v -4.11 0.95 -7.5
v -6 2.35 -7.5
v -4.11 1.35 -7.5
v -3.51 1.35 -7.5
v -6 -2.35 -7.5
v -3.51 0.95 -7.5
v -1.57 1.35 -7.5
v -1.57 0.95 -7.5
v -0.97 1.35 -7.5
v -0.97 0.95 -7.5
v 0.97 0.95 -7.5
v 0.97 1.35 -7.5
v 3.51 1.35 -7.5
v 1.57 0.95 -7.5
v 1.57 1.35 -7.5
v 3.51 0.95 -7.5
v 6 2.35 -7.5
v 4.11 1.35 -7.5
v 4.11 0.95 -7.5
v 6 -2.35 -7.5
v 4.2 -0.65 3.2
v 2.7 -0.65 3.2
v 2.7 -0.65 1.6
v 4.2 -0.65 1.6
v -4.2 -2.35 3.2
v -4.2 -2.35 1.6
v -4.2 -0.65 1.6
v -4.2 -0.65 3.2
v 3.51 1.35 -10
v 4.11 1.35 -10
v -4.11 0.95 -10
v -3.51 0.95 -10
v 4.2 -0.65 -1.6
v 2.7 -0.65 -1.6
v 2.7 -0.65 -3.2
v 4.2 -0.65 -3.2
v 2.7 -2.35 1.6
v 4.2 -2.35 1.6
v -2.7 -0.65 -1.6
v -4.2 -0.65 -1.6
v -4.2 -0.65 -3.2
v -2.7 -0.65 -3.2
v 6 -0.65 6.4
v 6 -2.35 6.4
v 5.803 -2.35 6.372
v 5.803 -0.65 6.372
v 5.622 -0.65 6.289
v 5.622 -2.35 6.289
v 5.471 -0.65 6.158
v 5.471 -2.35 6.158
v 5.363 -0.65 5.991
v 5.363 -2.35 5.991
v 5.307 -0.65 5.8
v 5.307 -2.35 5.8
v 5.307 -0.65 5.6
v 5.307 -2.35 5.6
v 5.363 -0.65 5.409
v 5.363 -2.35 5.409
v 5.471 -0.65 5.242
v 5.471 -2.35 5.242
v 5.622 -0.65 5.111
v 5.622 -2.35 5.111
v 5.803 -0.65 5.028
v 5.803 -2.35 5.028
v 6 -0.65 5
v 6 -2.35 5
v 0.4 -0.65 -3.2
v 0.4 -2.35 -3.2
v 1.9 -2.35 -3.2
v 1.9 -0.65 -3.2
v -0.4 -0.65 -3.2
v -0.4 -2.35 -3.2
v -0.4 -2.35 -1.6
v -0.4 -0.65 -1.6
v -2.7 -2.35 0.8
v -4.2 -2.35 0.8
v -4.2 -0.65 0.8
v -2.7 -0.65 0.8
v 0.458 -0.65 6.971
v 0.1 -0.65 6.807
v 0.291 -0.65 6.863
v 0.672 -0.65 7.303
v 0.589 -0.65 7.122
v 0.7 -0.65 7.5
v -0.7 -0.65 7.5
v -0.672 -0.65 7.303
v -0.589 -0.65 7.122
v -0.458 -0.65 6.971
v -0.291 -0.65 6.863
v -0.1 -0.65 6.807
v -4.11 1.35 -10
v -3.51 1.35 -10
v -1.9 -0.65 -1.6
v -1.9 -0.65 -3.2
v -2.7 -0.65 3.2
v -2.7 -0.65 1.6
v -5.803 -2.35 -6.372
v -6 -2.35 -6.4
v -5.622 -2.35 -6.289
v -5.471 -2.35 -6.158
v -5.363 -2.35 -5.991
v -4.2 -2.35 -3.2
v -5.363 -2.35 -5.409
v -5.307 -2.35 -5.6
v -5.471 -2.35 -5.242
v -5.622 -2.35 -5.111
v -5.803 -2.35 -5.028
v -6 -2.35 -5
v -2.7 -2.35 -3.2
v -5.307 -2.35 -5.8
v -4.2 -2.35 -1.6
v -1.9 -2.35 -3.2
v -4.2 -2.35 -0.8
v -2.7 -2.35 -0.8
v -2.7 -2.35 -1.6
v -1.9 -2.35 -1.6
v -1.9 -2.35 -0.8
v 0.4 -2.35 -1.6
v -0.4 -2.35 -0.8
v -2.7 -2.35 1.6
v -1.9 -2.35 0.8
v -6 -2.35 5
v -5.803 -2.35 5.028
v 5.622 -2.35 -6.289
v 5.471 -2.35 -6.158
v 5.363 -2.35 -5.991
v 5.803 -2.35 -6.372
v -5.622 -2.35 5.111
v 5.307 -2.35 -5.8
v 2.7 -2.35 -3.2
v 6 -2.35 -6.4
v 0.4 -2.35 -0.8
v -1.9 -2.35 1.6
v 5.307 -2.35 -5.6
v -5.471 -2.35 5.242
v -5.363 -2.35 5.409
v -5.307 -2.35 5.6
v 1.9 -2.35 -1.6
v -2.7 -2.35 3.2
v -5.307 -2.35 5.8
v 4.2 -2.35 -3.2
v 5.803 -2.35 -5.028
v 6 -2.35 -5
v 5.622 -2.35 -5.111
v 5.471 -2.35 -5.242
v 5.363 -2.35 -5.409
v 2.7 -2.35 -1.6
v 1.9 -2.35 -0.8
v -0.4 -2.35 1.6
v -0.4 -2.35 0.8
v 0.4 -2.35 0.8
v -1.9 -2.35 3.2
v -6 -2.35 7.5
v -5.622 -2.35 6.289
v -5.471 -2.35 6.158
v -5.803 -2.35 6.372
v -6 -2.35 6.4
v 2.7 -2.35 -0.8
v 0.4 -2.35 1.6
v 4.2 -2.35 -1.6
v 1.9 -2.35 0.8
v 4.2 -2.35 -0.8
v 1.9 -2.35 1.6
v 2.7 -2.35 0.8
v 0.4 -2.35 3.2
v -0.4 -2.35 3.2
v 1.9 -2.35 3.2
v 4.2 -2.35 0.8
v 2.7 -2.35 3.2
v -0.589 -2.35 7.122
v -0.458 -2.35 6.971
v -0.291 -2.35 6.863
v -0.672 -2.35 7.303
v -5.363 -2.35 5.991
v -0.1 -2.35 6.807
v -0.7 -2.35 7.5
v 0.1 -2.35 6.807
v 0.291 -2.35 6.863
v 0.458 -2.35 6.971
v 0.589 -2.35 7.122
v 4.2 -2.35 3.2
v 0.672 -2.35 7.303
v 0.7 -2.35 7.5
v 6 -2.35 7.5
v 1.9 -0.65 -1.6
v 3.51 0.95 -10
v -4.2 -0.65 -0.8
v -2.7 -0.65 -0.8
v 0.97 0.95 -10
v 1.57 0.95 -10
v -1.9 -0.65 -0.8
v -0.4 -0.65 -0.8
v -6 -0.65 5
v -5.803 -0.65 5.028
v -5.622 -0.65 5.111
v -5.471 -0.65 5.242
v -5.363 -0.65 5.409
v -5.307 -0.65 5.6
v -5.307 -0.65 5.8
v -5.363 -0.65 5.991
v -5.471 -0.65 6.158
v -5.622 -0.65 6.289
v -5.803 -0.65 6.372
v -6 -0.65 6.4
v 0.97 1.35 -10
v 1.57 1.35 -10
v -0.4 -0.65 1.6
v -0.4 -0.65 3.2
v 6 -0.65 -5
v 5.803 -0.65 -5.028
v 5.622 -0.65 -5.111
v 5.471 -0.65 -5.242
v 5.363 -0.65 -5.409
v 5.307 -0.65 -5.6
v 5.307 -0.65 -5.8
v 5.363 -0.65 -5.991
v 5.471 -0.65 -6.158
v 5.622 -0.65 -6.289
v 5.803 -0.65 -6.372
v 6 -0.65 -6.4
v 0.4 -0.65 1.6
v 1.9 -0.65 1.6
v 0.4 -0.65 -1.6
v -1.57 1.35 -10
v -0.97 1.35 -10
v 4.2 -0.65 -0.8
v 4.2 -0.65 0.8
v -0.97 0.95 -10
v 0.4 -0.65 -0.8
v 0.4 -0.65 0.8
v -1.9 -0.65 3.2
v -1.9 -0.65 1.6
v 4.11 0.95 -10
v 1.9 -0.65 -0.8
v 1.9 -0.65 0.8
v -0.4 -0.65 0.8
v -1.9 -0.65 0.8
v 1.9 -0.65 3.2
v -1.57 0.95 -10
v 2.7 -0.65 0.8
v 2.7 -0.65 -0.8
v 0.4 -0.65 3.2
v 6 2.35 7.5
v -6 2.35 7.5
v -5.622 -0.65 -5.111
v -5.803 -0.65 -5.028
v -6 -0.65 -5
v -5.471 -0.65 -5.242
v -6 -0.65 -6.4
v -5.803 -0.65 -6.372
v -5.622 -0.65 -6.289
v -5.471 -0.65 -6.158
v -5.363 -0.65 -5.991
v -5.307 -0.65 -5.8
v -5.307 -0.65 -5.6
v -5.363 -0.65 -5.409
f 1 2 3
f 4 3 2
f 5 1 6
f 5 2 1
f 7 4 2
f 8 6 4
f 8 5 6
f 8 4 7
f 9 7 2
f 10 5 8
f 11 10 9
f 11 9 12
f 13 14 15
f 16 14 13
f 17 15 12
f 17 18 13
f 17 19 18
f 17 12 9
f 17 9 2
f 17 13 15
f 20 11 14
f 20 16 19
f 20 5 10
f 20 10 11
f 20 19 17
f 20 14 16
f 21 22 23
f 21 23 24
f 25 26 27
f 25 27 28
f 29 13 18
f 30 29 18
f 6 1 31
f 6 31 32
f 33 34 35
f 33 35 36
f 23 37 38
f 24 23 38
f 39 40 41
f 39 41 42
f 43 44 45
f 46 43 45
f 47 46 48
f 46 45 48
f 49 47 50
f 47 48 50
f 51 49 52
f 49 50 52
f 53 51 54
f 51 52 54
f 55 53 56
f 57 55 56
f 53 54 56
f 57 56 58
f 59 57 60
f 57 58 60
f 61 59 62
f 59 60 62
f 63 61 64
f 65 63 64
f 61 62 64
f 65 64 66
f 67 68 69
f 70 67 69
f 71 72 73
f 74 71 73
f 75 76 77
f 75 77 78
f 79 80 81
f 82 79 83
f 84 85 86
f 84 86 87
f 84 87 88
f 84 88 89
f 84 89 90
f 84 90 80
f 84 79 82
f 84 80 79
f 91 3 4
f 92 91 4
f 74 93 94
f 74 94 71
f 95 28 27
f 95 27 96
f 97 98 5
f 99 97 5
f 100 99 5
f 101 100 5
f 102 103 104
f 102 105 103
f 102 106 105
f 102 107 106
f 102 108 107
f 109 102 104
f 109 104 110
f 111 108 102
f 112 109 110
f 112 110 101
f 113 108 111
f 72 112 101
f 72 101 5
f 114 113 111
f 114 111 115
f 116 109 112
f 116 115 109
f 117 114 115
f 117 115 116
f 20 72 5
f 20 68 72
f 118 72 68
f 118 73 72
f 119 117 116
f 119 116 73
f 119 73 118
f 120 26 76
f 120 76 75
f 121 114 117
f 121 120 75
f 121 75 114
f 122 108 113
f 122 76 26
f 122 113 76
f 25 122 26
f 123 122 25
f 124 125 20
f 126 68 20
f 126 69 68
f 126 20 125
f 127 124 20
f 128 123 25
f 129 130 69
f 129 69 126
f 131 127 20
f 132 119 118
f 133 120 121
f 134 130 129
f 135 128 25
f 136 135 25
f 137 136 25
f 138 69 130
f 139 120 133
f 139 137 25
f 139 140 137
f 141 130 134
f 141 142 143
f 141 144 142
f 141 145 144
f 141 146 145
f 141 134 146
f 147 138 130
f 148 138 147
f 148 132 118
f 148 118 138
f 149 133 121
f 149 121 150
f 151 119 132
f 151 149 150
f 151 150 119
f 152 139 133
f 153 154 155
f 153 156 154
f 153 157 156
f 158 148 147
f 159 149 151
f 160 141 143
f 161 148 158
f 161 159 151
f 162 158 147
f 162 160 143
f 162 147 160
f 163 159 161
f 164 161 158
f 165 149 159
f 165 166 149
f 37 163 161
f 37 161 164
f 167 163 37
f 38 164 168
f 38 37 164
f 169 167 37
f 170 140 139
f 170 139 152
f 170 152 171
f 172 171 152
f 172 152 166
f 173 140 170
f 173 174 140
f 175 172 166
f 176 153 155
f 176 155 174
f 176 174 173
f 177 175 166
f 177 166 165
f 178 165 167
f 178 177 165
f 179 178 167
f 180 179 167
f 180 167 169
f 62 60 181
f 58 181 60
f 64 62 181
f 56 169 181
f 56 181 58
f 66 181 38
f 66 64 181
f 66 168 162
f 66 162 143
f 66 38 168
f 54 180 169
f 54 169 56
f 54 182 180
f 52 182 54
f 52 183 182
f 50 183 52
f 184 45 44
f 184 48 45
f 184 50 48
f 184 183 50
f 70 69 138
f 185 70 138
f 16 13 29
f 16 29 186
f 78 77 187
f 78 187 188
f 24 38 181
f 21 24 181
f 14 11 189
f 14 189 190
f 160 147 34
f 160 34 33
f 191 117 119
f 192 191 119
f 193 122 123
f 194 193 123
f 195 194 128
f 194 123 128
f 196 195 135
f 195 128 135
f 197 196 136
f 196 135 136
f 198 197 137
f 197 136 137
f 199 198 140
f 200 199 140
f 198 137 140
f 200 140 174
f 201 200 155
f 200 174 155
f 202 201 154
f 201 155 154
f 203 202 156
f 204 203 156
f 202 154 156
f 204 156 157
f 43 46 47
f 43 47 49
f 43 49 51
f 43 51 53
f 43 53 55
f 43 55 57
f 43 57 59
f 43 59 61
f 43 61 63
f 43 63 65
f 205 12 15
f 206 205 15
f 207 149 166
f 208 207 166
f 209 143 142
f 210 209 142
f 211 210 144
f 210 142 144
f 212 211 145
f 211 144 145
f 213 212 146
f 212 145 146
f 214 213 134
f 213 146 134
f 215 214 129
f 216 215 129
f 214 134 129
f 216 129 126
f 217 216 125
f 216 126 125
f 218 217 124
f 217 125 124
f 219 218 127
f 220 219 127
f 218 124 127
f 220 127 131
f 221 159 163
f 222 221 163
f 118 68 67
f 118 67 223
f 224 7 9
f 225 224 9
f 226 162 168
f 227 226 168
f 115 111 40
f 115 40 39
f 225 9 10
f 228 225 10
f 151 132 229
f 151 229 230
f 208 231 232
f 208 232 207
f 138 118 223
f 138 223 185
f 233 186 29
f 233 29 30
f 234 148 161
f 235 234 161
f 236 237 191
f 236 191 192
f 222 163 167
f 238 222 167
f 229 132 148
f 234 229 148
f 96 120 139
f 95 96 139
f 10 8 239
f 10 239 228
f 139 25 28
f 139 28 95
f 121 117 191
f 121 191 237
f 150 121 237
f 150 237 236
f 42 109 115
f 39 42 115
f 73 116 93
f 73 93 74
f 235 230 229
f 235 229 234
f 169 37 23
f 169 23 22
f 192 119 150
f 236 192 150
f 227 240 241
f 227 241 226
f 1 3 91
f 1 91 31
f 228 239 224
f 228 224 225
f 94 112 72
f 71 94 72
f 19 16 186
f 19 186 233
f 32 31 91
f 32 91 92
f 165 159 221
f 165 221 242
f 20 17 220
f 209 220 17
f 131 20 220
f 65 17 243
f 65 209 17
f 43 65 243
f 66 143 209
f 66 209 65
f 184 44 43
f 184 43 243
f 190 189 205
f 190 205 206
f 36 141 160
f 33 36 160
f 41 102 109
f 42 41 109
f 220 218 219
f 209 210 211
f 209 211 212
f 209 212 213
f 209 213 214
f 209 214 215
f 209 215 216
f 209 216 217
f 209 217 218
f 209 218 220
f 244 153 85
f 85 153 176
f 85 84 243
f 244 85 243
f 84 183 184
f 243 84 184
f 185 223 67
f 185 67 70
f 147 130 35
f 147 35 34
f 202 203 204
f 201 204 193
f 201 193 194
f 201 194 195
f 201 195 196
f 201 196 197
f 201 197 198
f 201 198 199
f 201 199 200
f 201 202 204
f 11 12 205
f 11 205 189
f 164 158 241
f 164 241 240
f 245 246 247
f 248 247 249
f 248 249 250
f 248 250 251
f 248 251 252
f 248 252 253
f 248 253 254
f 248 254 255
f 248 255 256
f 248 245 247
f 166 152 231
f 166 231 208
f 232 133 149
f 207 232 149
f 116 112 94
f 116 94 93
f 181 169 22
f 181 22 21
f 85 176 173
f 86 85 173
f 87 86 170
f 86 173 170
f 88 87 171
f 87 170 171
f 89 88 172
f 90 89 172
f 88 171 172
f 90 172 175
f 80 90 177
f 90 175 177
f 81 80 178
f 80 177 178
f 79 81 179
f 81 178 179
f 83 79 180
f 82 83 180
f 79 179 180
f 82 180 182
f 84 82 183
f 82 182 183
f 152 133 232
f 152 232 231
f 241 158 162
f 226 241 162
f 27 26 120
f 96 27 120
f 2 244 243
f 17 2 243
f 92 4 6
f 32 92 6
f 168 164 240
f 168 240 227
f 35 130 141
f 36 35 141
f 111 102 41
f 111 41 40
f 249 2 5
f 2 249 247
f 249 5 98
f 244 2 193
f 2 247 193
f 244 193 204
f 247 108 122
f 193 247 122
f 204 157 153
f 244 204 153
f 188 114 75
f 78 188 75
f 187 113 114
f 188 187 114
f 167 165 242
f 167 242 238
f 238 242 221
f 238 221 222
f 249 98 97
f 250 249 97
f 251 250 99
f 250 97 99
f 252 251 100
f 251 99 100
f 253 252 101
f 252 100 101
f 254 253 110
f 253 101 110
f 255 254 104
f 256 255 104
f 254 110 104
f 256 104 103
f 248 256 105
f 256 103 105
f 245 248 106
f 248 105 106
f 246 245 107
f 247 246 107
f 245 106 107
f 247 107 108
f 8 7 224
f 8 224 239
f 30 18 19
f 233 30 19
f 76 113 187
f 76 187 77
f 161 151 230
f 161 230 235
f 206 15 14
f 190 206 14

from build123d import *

# Parameters (mm, degrees)
F0_W     = 12
F0_H     = 15
F1_DEPTH = 2.35
F2_W     = 1.5
F2_H     = 1.6
F3_DEPTH = 1.7
F4_W     = 0.6
F4_H     = 0.4
F5_DEPTH = 2.5


with BuildPart() as f1:
    # F0 (on Front) → F1 (new body, symmetric)
    with BuildSketch(Plane.XZ):
        Rectangle(F0_W, F0_H)
    extrude(amount=F1_DEPTH, both=True)

    # F2 (on face) → F3 (cut)
    with BuildSketch(Plane.XZ.offset(2.35)):
        with BuildLine():
            Line((-6, 6.4), (-6, 5))
            ThreePointArc((-6, 5), (-5.3, 5.7), (-6, 6.4))
        make_face()
        with Locations((-3.45, 2.4)):
            Rectangle(F2_W, F2_H)
        with Locations((-1.15, 2.4)):
            Rectangle(F2_W, F2_H)
        with Locations((1.15, 2.4)):
            Rectangle(F2_W, F2_H)
        with Locations((3.45, 2.4)):
            Rectangle(F2_W, F2_H)
        with Locations((3.45, 0)):
            Rectangle(F2_W, F2_H)
        with Locations((1.15, 0)):
            Rectangle(F2_W, F2_H)
        with Locations((-1.15, 0)):
            Rectangle(F2_W, F2_H)
        with Locations((-3.45, 0)):
            Rectangle(F2_W, F2_H)
        with Locations((-3.45, -2.4)):
            Rectangle(F2_W, F2_H)
        with Locations((-1.15, -2.4)):
            Rectangle(F2_W, F2_H)
        with Locations((1.15, -2.4)):
            Rectangle(F2_W, F2_H)
        with Locations((3.45, -2.4)):
            Rectangle(F2_W, F2_H)
        with BuildLine():
            Line((6, -6.4), (6, -5))
            ThreePointArc((6, -5), (5.3, -5.7), (6, -6.4))
        make_face()
        with BuildLine():
            Line((-6, -5), (-6, -6.4))
            ThreePointArc((-6, -6.4), (-5.3, -5.7), (-6, -5))
        make_face()
        with BuildLine():
            ThreePointArc((6, 6.4), (5.3, 5.7), (6, 5))
            Line((6, 5), (6, 6.4))
        make_face()
        with BuildLine():
            ThreePointArc((-0.7, 7.5), (0, 6.8), (0.7, 7.5))
            Line((0.7, 7.5), (-0.7, 7.5))
        make_face()
    extrude(amount=-F3_DEPTH, mode=Mode.SUBTRACT)

    # F4 (on face) → F5 (join)
    with BuildSketch(Plane(origin=(0, 0, -7.5), x_dir=(1, 0, 0), z_dir=(0, 0, -1))):
        with Locations((-3.81, -1.15)):
            Rectangle(F4_W, F4_H)
        with Locations((-1.27, -1.15)):
            Rectangle(F4_W, F4_H)
        with Locations((1.27, -1.15)):
            Rectangle(F4_W, F4_H)
        with Locations((3.81, -1.15)):
            Rectangle(F4_W, F4_H)
    extrude(amount=F5_DEPTH)


solid = f1.part
